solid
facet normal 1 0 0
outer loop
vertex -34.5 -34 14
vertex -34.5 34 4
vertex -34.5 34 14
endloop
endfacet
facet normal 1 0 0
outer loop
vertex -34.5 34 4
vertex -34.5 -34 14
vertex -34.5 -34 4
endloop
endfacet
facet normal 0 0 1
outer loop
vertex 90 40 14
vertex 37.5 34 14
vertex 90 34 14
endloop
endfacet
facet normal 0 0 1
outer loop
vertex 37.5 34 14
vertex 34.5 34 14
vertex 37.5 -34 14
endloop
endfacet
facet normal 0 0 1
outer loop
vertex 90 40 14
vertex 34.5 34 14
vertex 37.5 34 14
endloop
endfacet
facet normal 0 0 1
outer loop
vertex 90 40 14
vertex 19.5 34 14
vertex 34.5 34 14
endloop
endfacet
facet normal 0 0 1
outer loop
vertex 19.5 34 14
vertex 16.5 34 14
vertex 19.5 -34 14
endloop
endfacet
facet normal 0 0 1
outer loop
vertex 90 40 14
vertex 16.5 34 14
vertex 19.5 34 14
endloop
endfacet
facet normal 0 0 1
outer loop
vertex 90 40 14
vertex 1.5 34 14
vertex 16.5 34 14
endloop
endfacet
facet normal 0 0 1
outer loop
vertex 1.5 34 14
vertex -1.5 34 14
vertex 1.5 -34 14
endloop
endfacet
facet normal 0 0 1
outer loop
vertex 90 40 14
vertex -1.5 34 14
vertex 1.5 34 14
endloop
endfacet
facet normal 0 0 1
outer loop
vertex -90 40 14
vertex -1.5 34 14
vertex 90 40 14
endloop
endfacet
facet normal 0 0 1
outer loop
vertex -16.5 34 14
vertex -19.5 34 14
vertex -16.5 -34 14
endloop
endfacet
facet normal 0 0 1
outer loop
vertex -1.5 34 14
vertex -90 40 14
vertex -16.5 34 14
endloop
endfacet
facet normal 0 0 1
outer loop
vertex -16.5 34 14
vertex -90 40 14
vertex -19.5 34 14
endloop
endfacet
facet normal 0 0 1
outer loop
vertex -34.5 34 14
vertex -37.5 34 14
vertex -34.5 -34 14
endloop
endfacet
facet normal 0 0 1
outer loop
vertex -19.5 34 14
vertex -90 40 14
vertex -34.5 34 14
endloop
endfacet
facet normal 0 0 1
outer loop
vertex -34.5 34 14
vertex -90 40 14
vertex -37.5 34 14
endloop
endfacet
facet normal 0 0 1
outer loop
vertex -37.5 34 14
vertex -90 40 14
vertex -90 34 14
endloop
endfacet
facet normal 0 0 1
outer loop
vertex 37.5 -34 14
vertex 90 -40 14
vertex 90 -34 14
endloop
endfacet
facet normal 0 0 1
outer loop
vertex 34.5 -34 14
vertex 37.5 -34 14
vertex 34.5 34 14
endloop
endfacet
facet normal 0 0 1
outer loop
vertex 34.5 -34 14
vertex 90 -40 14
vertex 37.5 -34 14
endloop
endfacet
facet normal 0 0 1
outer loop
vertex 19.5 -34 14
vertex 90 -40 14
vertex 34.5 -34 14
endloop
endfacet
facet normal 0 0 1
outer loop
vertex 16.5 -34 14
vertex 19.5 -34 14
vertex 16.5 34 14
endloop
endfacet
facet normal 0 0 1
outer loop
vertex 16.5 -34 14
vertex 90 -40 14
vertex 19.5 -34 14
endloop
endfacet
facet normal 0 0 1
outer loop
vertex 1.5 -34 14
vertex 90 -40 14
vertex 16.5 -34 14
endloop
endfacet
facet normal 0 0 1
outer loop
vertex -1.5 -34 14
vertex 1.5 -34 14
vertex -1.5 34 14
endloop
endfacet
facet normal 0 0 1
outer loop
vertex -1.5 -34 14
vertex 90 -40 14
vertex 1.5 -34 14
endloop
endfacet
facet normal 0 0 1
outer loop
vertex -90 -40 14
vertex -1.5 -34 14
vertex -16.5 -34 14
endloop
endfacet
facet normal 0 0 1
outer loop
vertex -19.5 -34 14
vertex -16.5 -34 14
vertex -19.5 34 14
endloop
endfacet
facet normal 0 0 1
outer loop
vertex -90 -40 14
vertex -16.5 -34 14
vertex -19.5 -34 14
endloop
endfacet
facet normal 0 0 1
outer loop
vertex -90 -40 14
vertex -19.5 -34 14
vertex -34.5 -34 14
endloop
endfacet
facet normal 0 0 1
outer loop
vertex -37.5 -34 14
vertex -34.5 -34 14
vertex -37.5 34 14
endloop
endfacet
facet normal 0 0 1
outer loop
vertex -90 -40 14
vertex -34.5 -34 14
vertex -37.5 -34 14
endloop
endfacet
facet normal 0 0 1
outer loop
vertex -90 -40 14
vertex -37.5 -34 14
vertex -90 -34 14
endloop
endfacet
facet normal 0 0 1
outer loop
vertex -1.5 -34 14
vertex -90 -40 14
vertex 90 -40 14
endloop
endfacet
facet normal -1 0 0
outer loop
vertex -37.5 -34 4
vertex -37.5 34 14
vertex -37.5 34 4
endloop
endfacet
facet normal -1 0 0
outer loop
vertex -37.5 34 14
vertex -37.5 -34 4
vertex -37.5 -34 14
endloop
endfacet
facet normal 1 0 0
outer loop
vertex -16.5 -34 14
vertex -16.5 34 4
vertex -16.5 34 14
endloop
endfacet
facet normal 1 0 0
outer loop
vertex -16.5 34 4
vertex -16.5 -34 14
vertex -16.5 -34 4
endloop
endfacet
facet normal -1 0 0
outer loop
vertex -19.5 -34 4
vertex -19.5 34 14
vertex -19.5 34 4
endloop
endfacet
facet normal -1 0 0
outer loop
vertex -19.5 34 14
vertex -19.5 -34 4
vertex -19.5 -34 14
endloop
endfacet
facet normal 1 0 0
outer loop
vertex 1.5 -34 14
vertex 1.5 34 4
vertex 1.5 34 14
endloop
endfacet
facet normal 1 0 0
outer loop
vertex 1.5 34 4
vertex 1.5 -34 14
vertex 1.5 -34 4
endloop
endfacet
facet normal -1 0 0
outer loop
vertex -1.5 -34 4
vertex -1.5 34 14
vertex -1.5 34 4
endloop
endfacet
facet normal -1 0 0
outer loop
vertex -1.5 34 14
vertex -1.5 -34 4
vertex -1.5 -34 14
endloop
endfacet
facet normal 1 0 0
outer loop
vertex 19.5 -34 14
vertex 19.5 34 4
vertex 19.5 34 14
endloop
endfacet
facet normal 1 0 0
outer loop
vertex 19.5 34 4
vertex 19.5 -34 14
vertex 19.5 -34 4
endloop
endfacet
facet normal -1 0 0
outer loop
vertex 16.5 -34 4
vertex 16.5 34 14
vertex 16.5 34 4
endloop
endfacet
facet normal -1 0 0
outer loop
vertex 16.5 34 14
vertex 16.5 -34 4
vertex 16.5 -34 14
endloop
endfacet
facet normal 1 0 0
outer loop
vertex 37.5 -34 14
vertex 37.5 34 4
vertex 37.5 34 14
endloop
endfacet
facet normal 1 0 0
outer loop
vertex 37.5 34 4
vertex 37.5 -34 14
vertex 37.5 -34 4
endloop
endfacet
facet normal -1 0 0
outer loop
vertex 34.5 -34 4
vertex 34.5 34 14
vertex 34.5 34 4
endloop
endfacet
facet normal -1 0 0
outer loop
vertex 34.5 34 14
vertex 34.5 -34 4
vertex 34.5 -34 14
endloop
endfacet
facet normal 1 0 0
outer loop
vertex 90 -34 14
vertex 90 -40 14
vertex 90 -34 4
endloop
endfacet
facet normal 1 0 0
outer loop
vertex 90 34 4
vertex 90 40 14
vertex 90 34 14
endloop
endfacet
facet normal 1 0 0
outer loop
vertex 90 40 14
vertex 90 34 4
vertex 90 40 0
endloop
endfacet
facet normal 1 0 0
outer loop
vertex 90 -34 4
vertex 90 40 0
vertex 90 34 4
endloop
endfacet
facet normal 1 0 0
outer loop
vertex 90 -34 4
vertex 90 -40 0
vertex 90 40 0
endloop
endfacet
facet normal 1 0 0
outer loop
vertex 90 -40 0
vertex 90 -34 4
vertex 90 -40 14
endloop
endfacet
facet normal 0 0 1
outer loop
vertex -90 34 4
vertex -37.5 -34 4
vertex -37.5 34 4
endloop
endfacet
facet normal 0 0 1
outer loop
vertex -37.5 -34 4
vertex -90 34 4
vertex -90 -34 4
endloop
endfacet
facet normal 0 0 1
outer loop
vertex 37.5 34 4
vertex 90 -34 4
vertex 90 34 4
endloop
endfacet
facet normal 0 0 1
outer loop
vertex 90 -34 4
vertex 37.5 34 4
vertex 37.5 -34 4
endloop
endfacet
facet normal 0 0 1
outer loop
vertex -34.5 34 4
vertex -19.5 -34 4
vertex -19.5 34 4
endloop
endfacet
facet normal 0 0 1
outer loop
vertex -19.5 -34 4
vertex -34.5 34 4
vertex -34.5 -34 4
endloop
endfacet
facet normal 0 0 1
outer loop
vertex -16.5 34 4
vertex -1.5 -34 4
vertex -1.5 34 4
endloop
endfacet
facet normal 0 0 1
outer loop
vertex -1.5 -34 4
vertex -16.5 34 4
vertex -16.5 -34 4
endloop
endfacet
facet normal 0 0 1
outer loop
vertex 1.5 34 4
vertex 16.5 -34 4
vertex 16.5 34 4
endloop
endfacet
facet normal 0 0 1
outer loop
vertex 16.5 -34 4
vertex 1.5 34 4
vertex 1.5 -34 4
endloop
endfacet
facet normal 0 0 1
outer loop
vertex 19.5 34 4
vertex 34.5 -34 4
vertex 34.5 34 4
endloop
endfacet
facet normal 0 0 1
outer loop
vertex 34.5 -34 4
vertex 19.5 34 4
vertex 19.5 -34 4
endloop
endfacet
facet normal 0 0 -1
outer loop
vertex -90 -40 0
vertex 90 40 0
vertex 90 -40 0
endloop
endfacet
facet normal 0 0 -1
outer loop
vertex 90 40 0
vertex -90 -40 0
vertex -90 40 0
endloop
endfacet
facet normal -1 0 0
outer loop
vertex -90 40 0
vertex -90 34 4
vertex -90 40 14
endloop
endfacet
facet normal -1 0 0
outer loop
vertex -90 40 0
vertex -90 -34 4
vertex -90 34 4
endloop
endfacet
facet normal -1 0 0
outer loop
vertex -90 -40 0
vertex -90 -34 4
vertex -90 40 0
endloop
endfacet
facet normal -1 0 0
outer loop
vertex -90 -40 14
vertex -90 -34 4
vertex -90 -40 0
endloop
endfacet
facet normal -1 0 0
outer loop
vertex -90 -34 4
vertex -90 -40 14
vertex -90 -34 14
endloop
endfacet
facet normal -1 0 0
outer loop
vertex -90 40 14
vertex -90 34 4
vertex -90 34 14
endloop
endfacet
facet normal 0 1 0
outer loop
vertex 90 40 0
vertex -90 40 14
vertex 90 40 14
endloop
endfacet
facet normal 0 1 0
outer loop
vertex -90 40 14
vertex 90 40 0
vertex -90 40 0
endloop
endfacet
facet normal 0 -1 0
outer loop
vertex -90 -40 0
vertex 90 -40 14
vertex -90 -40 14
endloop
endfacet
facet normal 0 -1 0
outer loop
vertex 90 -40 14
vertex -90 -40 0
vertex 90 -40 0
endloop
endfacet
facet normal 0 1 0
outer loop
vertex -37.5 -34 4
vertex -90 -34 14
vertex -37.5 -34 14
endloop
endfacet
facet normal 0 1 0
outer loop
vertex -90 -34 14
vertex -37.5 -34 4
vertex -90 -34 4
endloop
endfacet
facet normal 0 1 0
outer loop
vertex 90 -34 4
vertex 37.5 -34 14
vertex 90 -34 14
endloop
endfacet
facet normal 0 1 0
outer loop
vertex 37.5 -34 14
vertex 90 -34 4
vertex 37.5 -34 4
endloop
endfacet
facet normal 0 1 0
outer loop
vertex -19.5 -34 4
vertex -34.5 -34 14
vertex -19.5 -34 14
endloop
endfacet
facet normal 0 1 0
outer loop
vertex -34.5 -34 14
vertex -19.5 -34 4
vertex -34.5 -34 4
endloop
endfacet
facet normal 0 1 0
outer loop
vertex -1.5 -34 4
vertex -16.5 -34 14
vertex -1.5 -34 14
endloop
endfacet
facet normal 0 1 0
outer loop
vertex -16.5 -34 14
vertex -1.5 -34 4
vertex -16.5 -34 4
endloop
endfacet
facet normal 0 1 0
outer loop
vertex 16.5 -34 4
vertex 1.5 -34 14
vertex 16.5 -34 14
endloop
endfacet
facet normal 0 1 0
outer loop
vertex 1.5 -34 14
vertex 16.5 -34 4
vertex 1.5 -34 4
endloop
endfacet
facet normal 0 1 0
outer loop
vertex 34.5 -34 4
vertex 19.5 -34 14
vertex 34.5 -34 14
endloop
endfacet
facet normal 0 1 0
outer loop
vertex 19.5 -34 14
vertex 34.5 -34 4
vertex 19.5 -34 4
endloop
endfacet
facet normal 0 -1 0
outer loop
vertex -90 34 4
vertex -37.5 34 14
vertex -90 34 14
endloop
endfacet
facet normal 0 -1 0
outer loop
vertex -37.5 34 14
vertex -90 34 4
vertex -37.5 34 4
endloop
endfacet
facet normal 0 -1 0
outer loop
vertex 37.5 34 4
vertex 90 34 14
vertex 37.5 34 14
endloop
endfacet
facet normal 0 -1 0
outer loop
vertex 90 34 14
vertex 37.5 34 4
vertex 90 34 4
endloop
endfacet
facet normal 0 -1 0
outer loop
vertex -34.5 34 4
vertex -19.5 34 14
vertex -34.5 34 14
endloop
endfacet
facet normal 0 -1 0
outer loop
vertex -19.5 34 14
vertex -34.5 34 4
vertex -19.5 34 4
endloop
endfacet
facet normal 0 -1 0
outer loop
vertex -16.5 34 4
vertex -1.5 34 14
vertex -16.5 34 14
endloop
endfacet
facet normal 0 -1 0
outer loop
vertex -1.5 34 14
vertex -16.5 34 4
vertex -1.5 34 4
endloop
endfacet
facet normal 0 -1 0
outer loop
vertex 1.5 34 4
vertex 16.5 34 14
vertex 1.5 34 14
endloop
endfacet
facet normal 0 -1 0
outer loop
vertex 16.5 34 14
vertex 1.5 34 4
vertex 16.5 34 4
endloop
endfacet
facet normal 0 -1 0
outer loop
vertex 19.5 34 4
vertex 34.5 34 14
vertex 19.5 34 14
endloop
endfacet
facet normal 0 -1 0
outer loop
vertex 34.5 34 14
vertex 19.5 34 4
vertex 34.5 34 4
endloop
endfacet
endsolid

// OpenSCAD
$fn = 32;

// ----------------------------------------------------------------------
// Rib frame 180 x 80 x 14
// 5 ribs at 18 mm pitch
// ----------------------------------------------------------------------

// --- parameters (mm) ---
frame = [180, 80, 4];  // base plate size (x, y, z)
rail_w = 6;            // side rail width
ribs = 5;              // number of ribs
rib_t = 3;             // rib thickness
rib_h = 10;            // rib height above the base plate
pitch = 18;            // pitch between rib centres

// --- derived feature positions (mm) ---
span = (ribs - 1) * pitch;          // = 72   distance between the outer ribs
origin_x = -span / 2;               // = -36   X of the first rib
rib_len = frame[1] - 2 * rail_w + 2;  // = 70   rib length, 1 mm into each rail
feature_centers = [
  [origin_x + 0 * pitch, 0],
  [origin_x + 1 * pitch, 0],
  [origin_x + 2 * pitch, 0],
  [origin_x + 3 * pitch, 0],
  [origin_x + 4 * pitch, 0]
];   // rib centre line, drives the rib loop

// base plate, two side rails, then the ribs read straight off feature_centers
union() {
  translate([-frame[0] / 2, -frame[1] / 2, 0]) cube(frame);
  translate([-frame[0] / 2, -frame[1] / 2, 0]) cube([frame[0], rail_w, frame[2] + rib_h]);
  translate([-frame[0] / 2, frame[1] / 2 - rail_w, 0]) cube([frame[0], rail_w, frame[2] + rib_h]);
  for (centre = feature_centers)
    translate([centre[0] - rib_t / 2, centre[1] - rib_len / 2, frame[2] - 1])
      cube([rib_t, rib_len, rib_h + 1]);
}
